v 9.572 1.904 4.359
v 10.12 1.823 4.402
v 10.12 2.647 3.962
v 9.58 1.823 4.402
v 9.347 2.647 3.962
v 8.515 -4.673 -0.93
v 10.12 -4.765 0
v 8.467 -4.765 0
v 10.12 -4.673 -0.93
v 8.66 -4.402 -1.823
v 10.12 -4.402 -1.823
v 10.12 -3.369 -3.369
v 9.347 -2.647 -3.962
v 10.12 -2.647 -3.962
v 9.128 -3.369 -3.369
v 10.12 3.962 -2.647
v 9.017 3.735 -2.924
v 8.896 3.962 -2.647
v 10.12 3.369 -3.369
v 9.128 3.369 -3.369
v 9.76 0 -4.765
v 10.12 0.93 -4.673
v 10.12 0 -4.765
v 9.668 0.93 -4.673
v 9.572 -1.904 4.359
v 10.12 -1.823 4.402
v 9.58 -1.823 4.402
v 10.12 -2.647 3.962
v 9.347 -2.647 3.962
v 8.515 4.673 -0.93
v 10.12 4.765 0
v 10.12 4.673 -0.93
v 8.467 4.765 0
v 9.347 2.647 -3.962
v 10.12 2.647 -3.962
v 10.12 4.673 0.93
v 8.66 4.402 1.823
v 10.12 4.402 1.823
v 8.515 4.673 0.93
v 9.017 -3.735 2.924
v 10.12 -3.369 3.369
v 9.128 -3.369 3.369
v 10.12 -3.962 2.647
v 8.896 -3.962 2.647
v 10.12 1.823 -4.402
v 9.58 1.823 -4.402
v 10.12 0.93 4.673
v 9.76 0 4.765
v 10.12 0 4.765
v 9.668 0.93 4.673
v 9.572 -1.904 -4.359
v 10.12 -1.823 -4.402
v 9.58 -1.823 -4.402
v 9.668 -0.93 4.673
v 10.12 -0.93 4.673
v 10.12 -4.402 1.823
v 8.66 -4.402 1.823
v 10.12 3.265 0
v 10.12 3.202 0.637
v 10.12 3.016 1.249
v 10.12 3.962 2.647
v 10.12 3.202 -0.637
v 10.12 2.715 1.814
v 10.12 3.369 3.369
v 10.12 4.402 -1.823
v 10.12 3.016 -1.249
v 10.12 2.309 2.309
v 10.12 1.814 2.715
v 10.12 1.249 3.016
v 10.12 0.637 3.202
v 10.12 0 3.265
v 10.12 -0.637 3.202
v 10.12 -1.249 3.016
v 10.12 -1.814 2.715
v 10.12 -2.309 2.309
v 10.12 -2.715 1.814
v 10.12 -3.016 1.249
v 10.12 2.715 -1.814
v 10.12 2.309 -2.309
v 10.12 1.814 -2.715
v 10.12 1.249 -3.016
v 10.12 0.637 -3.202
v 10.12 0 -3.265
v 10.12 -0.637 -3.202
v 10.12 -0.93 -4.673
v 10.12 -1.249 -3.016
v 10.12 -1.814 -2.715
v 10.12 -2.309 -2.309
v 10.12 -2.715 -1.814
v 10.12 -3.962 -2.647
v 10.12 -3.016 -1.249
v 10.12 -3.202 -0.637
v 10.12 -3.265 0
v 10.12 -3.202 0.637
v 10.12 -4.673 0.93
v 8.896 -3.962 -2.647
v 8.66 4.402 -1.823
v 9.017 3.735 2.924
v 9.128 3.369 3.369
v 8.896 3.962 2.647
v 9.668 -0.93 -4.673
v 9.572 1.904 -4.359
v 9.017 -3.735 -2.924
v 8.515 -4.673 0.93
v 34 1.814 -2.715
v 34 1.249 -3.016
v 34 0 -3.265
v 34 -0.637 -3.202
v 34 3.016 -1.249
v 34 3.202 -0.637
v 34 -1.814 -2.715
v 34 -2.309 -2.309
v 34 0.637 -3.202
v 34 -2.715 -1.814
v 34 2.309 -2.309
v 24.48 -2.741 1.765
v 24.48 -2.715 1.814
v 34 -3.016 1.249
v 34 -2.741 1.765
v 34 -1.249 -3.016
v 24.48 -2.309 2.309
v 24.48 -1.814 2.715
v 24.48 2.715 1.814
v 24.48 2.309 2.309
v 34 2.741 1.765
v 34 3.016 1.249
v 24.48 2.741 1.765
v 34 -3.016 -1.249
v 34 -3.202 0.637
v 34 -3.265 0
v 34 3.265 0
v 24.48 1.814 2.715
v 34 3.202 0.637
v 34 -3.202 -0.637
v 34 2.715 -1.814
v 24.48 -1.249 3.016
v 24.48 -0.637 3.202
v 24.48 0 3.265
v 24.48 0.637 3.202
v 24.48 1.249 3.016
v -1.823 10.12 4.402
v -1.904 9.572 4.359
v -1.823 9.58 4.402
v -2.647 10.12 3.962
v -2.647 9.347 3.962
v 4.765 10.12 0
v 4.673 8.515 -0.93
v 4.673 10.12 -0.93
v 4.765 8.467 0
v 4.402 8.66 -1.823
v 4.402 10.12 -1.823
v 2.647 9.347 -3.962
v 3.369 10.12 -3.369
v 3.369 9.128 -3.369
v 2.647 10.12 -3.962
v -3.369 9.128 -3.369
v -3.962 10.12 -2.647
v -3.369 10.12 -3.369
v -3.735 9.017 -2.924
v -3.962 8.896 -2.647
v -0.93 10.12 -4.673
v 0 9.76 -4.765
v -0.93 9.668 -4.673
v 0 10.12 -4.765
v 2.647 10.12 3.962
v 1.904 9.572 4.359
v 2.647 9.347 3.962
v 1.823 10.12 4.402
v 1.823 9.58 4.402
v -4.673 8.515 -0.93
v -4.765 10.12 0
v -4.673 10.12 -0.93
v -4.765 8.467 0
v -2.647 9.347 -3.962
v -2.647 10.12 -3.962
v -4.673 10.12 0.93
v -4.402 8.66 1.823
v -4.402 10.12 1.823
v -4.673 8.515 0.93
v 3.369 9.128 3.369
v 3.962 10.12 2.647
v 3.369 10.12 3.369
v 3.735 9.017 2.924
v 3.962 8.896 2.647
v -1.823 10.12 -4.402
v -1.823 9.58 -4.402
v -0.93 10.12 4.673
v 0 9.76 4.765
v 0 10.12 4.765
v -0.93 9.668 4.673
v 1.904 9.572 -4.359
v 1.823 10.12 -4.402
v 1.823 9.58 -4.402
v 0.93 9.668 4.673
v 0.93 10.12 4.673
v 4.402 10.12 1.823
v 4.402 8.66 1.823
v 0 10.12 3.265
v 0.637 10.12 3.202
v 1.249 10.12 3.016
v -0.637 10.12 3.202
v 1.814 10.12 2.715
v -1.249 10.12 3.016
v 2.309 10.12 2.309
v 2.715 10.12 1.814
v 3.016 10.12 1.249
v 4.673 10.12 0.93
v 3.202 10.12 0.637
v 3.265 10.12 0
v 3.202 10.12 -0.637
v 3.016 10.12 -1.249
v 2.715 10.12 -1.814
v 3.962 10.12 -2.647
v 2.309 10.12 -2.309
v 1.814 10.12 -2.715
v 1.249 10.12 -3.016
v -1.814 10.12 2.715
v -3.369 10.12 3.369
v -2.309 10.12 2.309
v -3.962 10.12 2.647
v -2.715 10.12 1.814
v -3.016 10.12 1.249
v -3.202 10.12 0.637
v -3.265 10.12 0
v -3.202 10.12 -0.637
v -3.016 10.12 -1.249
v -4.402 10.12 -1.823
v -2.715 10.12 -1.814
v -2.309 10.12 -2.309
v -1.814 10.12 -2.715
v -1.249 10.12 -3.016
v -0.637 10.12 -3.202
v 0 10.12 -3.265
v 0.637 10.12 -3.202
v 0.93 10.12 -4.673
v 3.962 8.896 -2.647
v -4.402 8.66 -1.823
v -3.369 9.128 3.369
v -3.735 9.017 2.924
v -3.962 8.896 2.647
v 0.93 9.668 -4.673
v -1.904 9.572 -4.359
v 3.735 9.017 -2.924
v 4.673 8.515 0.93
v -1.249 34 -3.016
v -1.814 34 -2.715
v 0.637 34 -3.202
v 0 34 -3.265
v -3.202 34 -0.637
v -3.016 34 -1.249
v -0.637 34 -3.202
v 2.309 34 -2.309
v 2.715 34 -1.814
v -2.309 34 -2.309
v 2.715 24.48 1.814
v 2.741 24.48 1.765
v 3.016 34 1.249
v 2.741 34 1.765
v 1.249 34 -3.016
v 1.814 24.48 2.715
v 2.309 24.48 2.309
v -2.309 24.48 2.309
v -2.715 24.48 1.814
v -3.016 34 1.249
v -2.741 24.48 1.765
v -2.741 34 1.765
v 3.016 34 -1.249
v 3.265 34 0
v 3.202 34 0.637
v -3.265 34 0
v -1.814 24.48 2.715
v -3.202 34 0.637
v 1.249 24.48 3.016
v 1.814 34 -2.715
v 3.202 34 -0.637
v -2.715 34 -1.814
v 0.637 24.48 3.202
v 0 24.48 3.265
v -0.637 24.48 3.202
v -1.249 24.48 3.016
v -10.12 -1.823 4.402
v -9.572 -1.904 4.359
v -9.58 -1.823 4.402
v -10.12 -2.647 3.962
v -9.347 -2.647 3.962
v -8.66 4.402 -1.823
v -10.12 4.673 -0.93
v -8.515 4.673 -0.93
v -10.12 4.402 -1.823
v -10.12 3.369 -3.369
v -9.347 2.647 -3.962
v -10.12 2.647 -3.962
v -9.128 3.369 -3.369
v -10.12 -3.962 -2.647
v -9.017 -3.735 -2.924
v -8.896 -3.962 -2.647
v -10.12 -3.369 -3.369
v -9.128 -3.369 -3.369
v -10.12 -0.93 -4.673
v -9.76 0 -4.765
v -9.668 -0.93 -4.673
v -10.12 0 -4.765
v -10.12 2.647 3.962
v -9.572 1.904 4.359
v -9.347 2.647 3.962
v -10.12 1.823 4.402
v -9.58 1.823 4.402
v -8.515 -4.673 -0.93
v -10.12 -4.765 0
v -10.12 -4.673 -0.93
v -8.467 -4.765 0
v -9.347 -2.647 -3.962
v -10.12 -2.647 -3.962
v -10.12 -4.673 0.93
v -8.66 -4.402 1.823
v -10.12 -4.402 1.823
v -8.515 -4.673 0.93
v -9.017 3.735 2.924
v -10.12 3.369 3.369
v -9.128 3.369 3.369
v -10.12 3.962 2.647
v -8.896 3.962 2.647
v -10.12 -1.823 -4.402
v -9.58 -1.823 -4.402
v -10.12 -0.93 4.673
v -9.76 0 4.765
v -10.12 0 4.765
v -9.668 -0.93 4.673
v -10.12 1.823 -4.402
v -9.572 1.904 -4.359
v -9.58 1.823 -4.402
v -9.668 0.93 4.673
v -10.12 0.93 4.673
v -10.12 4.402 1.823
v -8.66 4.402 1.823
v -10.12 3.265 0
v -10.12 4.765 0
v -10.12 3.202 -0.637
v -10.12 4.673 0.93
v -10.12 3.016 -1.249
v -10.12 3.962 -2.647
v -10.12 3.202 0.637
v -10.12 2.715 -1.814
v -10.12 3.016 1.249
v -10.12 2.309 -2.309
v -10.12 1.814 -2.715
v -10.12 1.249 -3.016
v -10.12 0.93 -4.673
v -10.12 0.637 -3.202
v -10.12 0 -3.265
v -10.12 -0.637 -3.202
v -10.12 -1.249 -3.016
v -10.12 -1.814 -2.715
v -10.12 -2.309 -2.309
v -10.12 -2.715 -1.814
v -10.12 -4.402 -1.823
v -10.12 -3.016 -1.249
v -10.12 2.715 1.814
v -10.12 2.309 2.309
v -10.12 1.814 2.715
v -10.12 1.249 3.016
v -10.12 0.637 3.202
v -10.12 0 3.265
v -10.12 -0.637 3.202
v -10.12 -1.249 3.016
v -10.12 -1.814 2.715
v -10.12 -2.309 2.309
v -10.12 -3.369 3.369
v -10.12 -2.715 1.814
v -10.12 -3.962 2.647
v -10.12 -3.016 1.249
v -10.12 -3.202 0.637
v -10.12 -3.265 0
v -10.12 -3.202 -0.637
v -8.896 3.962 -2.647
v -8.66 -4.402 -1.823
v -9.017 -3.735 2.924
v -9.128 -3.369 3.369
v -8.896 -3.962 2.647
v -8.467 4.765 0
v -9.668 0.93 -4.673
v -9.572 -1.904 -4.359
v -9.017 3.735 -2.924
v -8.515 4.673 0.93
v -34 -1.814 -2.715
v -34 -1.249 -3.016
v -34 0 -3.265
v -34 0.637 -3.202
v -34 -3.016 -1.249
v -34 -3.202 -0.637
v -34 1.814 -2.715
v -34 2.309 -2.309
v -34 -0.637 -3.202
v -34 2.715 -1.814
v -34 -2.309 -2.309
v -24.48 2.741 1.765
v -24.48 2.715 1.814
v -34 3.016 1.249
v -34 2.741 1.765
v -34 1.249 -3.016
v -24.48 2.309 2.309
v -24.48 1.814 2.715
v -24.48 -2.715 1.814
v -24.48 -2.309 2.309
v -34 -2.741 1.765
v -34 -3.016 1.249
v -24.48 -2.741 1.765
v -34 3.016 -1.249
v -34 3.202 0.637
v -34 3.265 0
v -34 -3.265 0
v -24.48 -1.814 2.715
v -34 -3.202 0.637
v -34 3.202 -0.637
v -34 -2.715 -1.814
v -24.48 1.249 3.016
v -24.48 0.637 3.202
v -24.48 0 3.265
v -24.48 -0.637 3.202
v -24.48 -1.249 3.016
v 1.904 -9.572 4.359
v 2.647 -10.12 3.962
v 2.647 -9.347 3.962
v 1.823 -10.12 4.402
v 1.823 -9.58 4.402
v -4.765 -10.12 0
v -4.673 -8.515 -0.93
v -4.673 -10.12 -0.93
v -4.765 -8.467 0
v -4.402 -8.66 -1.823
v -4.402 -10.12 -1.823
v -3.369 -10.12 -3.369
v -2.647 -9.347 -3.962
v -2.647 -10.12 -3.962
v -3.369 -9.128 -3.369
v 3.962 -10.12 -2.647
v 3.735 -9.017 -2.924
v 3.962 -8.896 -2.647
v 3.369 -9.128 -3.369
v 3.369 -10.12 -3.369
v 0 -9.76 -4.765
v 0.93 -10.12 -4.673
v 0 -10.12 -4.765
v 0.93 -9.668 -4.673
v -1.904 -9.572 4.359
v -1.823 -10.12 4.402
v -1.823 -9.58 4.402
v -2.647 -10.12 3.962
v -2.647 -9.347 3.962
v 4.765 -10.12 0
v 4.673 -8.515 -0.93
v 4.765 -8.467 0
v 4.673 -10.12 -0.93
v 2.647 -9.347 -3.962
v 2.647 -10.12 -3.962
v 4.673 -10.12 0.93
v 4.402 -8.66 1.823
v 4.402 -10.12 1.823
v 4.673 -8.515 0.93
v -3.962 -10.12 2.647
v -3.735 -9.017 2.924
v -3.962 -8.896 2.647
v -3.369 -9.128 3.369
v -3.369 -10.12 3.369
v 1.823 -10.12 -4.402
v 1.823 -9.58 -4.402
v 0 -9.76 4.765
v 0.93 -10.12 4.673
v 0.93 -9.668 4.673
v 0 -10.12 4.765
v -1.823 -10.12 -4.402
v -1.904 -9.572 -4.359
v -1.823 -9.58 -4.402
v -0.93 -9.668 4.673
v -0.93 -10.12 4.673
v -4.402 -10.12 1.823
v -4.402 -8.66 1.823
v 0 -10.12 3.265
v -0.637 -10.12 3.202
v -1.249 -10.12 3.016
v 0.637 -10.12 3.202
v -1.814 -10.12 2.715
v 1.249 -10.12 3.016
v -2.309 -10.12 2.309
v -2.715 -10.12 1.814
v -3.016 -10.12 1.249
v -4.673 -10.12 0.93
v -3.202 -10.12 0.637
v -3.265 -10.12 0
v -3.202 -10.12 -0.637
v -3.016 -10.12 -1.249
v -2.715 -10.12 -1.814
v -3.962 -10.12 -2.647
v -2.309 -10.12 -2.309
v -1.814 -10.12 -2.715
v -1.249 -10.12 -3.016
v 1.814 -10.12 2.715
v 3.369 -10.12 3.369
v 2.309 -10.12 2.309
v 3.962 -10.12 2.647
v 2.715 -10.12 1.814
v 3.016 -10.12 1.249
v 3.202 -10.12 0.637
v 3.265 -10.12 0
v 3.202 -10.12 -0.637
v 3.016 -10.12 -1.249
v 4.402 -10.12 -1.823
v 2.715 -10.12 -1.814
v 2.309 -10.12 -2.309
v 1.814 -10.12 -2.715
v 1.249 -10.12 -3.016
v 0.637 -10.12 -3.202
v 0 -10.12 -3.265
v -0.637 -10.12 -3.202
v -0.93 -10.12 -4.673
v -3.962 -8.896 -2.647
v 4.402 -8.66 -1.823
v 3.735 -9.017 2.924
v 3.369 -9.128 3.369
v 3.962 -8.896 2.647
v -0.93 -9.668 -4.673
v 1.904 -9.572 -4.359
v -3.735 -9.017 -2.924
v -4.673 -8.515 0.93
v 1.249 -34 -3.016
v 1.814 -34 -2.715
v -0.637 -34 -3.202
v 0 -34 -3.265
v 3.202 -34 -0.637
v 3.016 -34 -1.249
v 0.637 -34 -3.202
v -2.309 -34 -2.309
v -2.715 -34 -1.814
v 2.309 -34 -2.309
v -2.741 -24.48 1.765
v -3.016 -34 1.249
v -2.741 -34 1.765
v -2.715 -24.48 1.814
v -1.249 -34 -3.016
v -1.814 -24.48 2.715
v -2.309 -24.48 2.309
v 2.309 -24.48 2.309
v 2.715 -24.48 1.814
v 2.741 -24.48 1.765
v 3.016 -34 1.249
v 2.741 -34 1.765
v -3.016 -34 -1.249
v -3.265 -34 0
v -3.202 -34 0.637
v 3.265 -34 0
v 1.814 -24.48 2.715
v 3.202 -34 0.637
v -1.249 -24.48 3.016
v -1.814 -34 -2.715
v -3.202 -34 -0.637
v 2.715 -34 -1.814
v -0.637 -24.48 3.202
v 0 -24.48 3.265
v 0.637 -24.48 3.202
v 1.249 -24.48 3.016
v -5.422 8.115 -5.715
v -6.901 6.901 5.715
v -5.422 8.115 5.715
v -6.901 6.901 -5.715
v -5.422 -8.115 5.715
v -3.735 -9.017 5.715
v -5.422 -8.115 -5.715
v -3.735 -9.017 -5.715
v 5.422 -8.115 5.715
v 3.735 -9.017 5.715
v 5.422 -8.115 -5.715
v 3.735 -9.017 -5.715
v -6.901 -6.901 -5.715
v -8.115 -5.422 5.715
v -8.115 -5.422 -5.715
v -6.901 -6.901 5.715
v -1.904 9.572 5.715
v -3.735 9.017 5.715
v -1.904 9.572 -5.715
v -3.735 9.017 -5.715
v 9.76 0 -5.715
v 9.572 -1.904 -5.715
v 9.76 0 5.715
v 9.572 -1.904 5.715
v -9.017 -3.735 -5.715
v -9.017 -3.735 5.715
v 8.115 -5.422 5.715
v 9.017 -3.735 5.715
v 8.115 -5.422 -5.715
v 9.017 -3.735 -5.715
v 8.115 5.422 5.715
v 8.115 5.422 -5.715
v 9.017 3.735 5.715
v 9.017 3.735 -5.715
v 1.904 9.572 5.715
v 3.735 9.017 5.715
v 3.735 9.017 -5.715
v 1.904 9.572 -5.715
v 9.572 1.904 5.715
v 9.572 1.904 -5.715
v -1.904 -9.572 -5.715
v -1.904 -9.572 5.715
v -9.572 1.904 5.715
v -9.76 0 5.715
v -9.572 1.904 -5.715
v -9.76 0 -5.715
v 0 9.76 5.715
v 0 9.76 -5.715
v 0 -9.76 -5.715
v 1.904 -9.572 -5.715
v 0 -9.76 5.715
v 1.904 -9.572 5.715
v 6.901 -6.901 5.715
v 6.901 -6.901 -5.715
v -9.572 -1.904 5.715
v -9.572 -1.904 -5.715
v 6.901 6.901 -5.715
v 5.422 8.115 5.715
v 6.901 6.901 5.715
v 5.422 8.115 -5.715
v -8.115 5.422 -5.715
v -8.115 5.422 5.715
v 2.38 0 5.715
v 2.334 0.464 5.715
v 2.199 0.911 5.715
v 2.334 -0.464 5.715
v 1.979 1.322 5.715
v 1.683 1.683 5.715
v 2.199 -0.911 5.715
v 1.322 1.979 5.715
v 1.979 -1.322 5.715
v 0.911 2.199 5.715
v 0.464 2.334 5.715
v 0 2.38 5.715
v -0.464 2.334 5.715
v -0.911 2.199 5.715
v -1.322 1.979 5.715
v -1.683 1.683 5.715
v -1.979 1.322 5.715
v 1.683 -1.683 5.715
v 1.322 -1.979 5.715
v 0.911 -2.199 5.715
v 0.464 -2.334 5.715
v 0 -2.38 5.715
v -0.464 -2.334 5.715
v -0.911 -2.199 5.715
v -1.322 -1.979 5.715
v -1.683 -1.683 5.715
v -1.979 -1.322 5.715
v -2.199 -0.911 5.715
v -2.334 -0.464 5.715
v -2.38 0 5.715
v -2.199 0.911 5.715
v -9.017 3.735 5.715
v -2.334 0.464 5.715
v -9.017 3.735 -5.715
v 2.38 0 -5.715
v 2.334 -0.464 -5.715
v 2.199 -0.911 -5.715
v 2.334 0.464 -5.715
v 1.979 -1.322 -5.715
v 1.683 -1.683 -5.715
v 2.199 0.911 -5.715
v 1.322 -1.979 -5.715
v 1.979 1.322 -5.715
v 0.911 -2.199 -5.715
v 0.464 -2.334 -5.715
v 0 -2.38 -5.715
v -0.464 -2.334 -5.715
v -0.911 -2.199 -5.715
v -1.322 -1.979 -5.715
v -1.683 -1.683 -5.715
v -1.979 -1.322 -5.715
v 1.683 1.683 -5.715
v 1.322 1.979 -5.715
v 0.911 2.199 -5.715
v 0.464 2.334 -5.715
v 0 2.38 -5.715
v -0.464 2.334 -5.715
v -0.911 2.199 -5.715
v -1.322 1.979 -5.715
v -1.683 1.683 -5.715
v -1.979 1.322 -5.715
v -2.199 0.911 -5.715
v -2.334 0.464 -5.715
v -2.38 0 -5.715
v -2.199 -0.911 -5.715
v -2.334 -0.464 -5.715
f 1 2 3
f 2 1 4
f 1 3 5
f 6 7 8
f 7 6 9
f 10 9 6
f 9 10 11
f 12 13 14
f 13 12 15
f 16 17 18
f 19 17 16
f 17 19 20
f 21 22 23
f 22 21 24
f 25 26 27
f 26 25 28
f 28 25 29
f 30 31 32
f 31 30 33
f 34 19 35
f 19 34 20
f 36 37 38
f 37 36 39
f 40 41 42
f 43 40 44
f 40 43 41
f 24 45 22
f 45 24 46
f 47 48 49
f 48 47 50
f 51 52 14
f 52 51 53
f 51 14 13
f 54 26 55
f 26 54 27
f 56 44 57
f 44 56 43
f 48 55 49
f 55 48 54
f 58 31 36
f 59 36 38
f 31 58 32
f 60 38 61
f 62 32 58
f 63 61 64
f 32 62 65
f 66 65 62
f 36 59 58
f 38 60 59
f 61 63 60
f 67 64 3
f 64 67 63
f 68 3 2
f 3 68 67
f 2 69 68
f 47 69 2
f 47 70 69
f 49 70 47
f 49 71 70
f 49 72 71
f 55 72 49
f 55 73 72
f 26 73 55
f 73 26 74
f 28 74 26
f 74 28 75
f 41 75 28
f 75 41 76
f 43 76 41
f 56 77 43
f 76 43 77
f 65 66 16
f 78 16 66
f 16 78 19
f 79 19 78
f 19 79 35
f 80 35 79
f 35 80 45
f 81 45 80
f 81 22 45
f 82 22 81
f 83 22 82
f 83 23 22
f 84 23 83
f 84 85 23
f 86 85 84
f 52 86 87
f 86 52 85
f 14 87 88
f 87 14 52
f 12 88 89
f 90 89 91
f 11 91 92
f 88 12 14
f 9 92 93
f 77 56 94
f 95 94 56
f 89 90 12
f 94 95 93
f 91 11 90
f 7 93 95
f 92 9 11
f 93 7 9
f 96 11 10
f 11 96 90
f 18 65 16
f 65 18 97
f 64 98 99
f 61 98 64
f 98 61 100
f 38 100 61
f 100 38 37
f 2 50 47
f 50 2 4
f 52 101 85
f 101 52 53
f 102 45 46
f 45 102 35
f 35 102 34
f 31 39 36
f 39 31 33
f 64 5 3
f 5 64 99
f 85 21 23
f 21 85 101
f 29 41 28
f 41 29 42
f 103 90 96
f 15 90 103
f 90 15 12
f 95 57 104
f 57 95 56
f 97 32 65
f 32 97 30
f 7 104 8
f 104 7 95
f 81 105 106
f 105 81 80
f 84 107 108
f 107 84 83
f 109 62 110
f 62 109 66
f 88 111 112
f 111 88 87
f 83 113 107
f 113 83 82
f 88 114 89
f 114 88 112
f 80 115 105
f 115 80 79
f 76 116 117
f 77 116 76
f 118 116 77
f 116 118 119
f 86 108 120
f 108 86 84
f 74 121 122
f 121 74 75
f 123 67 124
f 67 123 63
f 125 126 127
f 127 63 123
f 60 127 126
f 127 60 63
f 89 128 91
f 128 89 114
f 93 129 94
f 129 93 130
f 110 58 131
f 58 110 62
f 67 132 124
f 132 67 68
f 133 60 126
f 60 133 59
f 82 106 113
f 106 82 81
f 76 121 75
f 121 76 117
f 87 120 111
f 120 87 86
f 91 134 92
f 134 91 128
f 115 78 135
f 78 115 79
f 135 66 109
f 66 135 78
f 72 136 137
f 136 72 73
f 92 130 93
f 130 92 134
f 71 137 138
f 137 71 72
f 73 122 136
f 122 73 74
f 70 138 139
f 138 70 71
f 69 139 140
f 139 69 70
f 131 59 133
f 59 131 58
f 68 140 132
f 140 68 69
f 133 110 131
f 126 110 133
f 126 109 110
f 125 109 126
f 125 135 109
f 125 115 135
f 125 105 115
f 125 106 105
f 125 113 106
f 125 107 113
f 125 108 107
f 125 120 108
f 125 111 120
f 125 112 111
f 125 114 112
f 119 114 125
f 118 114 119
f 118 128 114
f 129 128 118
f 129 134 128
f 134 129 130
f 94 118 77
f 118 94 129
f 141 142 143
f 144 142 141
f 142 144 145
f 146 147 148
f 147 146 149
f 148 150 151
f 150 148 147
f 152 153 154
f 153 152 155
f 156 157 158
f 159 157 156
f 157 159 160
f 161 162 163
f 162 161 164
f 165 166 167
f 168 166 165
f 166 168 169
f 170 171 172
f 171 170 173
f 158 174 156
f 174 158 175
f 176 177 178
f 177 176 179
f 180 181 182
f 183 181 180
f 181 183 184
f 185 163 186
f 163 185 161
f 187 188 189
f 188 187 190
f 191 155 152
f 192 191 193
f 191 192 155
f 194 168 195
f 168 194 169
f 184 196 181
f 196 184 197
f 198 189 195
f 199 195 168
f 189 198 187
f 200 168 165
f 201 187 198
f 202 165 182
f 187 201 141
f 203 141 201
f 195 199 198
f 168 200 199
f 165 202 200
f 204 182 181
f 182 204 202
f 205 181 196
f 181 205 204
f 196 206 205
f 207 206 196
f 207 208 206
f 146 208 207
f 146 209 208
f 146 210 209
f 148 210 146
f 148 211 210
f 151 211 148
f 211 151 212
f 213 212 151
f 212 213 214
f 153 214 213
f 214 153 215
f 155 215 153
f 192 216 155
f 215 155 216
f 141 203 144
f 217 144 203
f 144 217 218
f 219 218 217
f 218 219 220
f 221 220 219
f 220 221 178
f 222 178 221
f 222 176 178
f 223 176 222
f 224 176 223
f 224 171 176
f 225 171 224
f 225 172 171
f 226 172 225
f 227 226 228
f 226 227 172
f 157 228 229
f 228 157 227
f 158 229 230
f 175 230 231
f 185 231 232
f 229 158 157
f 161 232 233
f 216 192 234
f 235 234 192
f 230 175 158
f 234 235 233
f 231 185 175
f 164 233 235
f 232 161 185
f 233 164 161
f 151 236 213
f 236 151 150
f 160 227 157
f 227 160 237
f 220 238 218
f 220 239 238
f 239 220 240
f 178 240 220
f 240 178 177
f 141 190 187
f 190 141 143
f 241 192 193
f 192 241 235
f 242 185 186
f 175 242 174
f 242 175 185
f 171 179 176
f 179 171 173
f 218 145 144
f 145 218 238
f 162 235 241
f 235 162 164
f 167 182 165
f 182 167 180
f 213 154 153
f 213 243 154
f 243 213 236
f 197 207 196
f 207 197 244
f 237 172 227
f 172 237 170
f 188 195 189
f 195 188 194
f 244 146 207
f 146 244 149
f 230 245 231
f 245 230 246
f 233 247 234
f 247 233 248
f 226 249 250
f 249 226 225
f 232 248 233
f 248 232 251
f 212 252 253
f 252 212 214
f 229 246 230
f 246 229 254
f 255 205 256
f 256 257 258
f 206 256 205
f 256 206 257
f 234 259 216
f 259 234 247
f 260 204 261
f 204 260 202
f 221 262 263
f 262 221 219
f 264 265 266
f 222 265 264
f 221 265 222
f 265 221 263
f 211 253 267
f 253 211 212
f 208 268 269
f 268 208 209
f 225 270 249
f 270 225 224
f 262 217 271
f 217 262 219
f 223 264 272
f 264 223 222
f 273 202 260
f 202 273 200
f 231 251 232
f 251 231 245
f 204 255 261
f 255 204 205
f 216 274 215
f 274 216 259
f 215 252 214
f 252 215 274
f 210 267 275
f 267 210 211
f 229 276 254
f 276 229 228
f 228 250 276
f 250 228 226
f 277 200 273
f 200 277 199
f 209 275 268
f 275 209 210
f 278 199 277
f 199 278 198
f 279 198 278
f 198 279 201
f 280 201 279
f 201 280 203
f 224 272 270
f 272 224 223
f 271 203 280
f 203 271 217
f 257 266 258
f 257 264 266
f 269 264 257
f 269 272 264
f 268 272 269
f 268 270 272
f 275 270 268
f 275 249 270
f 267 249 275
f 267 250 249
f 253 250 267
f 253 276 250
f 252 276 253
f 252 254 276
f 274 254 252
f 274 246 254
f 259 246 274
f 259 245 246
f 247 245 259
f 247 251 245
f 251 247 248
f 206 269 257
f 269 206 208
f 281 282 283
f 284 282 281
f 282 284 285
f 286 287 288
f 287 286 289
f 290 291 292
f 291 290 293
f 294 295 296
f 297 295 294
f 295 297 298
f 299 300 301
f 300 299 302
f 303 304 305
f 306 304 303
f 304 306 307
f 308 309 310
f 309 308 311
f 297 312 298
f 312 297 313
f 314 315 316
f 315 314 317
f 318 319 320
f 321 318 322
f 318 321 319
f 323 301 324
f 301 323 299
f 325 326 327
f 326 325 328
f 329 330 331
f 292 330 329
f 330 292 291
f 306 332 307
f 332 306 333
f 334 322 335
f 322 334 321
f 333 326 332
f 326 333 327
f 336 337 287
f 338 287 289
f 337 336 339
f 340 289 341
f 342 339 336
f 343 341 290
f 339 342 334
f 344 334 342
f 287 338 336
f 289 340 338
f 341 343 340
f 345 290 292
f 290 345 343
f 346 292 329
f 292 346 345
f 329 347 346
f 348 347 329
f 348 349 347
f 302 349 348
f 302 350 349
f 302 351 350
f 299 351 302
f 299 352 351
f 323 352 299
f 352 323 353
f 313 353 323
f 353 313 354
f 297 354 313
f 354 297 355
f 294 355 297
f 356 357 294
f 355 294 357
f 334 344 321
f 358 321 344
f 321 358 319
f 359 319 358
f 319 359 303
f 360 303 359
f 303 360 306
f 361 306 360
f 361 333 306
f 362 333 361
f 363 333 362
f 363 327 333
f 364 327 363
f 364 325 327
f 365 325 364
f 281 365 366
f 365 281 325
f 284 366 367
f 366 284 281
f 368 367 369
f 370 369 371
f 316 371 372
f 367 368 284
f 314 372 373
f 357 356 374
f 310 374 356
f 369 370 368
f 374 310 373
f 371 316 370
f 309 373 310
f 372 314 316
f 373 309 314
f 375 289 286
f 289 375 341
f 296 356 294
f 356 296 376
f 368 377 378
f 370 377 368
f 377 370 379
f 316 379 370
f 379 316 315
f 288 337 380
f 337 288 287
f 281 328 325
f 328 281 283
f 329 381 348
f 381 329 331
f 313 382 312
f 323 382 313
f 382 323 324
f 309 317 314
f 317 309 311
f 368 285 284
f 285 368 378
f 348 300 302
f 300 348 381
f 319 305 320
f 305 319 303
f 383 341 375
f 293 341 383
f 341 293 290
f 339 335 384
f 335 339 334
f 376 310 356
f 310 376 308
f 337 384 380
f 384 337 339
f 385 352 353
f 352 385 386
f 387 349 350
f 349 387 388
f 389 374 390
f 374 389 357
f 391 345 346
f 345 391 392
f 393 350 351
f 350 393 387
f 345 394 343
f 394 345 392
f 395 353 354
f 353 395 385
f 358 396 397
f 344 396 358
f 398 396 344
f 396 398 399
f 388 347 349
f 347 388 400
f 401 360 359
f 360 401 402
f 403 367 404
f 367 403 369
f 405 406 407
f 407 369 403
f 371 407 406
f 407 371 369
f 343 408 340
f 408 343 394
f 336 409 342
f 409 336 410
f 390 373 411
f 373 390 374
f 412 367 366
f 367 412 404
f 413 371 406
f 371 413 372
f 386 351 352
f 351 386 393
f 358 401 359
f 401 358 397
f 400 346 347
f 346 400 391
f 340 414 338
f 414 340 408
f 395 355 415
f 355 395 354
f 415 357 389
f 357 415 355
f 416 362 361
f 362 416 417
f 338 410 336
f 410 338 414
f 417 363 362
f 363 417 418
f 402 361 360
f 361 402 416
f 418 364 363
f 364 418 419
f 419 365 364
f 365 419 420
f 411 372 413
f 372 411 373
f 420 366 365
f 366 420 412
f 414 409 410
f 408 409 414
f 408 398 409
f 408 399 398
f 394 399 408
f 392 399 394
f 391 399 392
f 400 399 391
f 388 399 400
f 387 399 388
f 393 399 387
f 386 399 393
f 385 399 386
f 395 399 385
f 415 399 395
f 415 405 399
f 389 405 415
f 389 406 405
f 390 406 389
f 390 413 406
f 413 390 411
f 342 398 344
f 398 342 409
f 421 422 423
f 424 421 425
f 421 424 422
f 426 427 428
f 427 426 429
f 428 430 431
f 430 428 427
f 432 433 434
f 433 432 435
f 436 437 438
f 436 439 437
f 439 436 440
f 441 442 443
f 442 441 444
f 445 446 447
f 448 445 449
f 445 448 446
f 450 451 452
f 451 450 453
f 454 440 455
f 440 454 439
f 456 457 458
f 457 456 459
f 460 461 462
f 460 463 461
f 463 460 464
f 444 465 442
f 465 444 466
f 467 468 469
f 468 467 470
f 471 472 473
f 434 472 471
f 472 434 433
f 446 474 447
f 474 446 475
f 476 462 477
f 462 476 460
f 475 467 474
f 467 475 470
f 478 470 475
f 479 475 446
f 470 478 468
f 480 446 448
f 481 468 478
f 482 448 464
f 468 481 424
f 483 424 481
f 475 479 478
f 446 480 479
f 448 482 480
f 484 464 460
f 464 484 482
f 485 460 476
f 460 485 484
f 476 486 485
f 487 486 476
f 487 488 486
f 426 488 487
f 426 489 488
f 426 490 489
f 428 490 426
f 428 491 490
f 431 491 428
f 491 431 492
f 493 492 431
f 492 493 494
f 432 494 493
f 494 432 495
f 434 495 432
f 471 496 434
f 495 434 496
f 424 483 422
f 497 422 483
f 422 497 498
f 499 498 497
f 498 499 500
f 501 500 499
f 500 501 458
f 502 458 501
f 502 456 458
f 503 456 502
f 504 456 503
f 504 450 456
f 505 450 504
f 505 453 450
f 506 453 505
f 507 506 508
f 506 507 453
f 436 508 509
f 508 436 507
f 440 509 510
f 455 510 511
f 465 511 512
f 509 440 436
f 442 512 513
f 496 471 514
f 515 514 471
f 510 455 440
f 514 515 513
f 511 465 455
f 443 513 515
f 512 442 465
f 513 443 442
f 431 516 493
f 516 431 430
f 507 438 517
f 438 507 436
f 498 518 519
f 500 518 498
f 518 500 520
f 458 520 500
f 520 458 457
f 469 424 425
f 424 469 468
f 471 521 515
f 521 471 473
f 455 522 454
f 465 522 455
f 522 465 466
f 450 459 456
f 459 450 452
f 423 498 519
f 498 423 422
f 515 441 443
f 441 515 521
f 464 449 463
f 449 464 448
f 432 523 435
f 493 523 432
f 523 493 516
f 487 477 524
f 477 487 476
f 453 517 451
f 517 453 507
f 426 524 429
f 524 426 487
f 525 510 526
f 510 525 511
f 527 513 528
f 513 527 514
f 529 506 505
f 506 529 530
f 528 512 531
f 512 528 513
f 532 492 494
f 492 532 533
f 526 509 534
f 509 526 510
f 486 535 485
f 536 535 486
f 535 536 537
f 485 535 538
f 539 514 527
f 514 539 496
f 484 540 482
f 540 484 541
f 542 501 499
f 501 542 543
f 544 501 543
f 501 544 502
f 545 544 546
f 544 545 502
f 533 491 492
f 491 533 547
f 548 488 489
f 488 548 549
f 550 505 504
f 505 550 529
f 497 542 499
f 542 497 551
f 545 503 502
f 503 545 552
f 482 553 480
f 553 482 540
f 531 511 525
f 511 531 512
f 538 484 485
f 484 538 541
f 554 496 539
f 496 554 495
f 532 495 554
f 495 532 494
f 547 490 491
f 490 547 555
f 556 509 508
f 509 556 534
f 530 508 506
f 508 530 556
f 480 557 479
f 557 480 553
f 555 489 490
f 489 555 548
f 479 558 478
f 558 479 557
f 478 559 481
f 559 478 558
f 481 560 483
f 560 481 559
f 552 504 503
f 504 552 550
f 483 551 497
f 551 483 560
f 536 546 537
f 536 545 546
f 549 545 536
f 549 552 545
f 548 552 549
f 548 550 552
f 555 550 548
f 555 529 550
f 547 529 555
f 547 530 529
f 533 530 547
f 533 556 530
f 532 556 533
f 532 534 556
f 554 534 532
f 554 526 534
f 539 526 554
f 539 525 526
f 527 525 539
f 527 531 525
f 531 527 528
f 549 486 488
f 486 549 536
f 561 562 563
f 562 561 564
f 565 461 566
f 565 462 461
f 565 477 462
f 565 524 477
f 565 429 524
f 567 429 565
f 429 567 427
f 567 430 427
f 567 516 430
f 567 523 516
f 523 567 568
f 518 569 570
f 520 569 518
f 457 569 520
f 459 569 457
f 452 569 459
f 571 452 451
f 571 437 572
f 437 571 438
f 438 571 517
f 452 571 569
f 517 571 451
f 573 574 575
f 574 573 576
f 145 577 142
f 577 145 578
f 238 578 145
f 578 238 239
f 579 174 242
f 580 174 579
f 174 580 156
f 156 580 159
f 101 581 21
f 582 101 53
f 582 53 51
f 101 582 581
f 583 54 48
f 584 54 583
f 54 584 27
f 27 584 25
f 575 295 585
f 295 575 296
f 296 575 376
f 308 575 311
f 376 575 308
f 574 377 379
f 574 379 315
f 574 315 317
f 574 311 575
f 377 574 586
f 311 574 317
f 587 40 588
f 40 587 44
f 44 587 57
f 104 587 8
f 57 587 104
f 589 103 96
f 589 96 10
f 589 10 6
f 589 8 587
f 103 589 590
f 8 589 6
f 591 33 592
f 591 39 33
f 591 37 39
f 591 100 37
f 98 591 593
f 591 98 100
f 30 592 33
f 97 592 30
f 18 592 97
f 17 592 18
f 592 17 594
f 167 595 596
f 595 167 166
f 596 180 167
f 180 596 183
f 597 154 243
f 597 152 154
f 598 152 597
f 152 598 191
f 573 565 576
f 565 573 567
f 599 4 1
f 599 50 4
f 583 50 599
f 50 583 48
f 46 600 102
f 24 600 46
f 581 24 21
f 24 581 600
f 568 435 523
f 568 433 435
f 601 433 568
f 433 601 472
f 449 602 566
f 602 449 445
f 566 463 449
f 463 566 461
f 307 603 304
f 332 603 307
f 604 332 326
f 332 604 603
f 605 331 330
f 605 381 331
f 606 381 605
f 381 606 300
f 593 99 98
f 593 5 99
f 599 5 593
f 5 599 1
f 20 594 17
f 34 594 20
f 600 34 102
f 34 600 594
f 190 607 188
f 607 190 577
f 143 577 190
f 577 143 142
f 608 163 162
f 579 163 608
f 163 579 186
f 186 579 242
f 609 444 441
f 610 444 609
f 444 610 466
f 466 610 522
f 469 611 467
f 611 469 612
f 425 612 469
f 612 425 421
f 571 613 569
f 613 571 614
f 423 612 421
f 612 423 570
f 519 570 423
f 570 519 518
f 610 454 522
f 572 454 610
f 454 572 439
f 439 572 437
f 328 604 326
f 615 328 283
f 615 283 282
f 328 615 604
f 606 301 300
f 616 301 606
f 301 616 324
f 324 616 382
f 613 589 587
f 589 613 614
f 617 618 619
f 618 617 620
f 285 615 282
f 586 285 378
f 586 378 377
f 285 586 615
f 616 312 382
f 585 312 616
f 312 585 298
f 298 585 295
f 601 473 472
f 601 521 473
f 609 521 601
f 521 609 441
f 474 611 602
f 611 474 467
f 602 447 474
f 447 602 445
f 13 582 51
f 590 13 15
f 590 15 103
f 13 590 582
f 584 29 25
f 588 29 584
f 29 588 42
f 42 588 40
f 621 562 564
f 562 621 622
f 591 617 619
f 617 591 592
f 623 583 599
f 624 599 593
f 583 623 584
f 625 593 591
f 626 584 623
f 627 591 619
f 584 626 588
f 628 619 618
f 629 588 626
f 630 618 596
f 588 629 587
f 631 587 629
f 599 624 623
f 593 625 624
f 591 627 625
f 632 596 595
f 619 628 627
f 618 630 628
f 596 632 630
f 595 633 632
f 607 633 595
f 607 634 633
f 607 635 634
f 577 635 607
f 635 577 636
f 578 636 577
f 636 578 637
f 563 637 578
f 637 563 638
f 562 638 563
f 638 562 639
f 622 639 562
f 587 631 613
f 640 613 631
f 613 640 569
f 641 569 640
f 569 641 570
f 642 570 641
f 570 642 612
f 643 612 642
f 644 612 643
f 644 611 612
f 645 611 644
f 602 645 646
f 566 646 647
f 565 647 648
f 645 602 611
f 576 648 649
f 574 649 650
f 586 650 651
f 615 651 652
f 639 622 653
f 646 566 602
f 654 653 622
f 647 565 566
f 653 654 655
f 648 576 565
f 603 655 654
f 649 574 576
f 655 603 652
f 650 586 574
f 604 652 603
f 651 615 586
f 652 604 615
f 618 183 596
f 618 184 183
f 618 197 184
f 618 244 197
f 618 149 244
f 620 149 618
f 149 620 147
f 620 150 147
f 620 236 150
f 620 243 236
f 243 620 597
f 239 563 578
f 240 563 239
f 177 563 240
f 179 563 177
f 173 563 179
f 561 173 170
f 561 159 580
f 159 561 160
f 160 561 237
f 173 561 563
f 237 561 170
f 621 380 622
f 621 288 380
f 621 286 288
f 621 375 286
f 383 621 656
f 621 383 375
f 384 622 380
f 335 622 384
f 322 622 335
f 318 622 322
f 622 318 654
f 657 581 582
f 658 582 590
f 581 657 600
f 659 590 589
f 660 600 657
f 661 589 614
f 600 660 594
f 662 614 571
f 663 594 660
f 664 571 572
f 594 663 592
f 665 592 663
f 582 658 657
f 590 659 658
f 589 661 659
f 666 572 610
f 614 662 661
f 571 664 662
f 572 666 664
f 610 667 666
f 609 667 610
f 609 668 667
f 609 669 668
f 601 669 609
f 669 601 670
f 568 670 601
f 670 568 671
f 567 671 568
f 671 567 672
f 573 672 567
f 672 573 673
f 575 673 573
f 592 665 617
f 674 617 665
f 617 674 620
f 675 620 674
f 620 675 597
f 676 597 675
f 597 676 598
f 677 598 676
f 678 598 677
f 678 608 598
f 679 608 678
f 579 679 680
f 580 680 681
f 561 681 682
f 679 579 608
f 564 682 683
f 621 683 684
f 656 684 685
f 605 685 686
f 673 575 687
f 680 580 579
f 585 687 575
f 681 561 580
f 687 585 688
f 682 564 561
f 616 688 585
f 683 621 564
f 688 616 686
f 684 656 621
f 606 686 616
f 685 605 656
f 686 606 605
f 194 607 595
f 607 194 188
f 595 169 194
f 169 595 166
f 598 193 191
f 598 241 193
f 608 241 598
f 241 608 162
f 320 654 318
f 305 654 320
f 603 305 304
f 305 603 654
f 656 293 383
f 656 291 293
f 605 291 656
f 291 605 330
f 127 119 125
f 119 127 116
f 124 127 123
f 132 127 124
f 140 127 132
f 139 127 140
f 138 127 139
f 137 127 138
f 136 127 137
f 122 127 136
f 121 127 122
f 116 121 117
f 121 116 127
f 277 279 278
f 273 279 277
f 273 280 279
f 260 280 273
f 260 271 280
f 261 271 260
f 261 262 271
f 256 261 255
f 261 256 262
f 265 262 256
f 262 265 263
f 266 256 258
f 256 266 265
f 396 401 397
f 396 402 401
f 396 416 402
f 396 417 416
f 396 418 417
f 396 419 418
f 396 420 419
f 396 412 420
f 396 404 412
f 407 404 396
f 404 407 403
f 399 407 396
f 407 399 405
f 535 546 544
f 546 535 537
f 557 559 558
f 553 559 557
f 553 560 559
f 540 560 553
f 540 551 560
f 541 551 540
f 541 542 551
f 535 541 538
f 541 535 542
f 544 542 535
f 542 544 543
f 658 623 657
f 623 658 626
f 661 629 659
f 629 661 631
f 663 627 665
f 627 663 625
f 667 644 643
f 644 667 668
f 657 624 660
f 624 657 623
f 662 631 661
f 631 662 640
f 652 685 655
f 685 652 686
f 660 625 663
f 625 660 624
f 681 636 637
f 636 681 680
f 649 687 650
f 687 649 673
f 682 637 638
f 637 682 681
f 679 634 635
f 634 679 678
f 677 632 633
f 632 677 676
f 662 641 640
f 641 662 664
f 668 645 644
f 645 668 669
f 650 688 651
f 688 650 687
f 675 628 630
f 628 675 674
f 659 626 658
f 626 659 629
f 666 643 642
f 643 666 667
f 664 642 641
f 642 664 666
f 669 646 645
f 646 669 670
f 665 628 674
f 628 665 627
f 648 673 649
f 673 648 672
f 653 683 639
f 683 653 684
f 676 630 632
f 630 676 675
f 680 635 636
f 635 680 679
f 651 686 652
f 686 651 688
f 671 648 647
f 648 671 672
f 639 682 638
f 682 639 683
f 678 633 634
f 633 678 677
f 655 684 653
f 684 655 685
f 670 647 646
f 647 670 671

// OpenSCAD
$fn = 32;

// ----------------------------------------------------------------------
// Cardan cross: 68 mm span, 9.53 mm trunnions
// ----------------------------------------------------------------------

// --- parameters (mm) ---
journal_d = 9.53;         // trunnion diameter
arm_len = 34;             // trunnion length from the centre
step_r = 3.24;            // step position from the centre
step_d = 6.53;            // journal diameter after the step
hub_d = 19.52;            // hub diameter
hub_h = 11.43;            // hub height
bore_d = 4.76;            // hub bore
flat_d = 1.5;             // depth of the journal flat
flat_len = 9.52;          // length of the journal flat

difference() {
  union() {
    /* hub along the joint axis */
    cylinder(h = hub_h, d = hub_d, center = true);
    for (a = [0 : 90 : 270]) rotate([0, 0, a]) {
      /* trunnion, sunk into the hub */
      translate([hub_d / 4, 0, 0]) rotate([0, 90, 0]) cylinder(h = step_r + 2, d = journal_d);
      /* stepped journal out to the tip */
      translate([step_r - 0.5, 0, 0]) rotate([0, 90, 0]) cylinder(h = arm_len + 0.5 - step_r, d = step_d);
    }
  }
  /* lubrication bore through the hub, 2.5 mm clear on both sides */
  translate([0, 0, -hub_h / 2 - 2.5]) cylinder(h = hub_h + 5, d = bore_d);
  /* machined flat on each journal tip */
  for (a = [0 : 90 : 270]) rotate([0, 0, a]) {
    translate([arm_len - flat_len, -step_d, step_d / 2 - flat_d]) cube([flat_len + 0.5, 2 * step_d, flat_d + 2.5]);
  }
}
